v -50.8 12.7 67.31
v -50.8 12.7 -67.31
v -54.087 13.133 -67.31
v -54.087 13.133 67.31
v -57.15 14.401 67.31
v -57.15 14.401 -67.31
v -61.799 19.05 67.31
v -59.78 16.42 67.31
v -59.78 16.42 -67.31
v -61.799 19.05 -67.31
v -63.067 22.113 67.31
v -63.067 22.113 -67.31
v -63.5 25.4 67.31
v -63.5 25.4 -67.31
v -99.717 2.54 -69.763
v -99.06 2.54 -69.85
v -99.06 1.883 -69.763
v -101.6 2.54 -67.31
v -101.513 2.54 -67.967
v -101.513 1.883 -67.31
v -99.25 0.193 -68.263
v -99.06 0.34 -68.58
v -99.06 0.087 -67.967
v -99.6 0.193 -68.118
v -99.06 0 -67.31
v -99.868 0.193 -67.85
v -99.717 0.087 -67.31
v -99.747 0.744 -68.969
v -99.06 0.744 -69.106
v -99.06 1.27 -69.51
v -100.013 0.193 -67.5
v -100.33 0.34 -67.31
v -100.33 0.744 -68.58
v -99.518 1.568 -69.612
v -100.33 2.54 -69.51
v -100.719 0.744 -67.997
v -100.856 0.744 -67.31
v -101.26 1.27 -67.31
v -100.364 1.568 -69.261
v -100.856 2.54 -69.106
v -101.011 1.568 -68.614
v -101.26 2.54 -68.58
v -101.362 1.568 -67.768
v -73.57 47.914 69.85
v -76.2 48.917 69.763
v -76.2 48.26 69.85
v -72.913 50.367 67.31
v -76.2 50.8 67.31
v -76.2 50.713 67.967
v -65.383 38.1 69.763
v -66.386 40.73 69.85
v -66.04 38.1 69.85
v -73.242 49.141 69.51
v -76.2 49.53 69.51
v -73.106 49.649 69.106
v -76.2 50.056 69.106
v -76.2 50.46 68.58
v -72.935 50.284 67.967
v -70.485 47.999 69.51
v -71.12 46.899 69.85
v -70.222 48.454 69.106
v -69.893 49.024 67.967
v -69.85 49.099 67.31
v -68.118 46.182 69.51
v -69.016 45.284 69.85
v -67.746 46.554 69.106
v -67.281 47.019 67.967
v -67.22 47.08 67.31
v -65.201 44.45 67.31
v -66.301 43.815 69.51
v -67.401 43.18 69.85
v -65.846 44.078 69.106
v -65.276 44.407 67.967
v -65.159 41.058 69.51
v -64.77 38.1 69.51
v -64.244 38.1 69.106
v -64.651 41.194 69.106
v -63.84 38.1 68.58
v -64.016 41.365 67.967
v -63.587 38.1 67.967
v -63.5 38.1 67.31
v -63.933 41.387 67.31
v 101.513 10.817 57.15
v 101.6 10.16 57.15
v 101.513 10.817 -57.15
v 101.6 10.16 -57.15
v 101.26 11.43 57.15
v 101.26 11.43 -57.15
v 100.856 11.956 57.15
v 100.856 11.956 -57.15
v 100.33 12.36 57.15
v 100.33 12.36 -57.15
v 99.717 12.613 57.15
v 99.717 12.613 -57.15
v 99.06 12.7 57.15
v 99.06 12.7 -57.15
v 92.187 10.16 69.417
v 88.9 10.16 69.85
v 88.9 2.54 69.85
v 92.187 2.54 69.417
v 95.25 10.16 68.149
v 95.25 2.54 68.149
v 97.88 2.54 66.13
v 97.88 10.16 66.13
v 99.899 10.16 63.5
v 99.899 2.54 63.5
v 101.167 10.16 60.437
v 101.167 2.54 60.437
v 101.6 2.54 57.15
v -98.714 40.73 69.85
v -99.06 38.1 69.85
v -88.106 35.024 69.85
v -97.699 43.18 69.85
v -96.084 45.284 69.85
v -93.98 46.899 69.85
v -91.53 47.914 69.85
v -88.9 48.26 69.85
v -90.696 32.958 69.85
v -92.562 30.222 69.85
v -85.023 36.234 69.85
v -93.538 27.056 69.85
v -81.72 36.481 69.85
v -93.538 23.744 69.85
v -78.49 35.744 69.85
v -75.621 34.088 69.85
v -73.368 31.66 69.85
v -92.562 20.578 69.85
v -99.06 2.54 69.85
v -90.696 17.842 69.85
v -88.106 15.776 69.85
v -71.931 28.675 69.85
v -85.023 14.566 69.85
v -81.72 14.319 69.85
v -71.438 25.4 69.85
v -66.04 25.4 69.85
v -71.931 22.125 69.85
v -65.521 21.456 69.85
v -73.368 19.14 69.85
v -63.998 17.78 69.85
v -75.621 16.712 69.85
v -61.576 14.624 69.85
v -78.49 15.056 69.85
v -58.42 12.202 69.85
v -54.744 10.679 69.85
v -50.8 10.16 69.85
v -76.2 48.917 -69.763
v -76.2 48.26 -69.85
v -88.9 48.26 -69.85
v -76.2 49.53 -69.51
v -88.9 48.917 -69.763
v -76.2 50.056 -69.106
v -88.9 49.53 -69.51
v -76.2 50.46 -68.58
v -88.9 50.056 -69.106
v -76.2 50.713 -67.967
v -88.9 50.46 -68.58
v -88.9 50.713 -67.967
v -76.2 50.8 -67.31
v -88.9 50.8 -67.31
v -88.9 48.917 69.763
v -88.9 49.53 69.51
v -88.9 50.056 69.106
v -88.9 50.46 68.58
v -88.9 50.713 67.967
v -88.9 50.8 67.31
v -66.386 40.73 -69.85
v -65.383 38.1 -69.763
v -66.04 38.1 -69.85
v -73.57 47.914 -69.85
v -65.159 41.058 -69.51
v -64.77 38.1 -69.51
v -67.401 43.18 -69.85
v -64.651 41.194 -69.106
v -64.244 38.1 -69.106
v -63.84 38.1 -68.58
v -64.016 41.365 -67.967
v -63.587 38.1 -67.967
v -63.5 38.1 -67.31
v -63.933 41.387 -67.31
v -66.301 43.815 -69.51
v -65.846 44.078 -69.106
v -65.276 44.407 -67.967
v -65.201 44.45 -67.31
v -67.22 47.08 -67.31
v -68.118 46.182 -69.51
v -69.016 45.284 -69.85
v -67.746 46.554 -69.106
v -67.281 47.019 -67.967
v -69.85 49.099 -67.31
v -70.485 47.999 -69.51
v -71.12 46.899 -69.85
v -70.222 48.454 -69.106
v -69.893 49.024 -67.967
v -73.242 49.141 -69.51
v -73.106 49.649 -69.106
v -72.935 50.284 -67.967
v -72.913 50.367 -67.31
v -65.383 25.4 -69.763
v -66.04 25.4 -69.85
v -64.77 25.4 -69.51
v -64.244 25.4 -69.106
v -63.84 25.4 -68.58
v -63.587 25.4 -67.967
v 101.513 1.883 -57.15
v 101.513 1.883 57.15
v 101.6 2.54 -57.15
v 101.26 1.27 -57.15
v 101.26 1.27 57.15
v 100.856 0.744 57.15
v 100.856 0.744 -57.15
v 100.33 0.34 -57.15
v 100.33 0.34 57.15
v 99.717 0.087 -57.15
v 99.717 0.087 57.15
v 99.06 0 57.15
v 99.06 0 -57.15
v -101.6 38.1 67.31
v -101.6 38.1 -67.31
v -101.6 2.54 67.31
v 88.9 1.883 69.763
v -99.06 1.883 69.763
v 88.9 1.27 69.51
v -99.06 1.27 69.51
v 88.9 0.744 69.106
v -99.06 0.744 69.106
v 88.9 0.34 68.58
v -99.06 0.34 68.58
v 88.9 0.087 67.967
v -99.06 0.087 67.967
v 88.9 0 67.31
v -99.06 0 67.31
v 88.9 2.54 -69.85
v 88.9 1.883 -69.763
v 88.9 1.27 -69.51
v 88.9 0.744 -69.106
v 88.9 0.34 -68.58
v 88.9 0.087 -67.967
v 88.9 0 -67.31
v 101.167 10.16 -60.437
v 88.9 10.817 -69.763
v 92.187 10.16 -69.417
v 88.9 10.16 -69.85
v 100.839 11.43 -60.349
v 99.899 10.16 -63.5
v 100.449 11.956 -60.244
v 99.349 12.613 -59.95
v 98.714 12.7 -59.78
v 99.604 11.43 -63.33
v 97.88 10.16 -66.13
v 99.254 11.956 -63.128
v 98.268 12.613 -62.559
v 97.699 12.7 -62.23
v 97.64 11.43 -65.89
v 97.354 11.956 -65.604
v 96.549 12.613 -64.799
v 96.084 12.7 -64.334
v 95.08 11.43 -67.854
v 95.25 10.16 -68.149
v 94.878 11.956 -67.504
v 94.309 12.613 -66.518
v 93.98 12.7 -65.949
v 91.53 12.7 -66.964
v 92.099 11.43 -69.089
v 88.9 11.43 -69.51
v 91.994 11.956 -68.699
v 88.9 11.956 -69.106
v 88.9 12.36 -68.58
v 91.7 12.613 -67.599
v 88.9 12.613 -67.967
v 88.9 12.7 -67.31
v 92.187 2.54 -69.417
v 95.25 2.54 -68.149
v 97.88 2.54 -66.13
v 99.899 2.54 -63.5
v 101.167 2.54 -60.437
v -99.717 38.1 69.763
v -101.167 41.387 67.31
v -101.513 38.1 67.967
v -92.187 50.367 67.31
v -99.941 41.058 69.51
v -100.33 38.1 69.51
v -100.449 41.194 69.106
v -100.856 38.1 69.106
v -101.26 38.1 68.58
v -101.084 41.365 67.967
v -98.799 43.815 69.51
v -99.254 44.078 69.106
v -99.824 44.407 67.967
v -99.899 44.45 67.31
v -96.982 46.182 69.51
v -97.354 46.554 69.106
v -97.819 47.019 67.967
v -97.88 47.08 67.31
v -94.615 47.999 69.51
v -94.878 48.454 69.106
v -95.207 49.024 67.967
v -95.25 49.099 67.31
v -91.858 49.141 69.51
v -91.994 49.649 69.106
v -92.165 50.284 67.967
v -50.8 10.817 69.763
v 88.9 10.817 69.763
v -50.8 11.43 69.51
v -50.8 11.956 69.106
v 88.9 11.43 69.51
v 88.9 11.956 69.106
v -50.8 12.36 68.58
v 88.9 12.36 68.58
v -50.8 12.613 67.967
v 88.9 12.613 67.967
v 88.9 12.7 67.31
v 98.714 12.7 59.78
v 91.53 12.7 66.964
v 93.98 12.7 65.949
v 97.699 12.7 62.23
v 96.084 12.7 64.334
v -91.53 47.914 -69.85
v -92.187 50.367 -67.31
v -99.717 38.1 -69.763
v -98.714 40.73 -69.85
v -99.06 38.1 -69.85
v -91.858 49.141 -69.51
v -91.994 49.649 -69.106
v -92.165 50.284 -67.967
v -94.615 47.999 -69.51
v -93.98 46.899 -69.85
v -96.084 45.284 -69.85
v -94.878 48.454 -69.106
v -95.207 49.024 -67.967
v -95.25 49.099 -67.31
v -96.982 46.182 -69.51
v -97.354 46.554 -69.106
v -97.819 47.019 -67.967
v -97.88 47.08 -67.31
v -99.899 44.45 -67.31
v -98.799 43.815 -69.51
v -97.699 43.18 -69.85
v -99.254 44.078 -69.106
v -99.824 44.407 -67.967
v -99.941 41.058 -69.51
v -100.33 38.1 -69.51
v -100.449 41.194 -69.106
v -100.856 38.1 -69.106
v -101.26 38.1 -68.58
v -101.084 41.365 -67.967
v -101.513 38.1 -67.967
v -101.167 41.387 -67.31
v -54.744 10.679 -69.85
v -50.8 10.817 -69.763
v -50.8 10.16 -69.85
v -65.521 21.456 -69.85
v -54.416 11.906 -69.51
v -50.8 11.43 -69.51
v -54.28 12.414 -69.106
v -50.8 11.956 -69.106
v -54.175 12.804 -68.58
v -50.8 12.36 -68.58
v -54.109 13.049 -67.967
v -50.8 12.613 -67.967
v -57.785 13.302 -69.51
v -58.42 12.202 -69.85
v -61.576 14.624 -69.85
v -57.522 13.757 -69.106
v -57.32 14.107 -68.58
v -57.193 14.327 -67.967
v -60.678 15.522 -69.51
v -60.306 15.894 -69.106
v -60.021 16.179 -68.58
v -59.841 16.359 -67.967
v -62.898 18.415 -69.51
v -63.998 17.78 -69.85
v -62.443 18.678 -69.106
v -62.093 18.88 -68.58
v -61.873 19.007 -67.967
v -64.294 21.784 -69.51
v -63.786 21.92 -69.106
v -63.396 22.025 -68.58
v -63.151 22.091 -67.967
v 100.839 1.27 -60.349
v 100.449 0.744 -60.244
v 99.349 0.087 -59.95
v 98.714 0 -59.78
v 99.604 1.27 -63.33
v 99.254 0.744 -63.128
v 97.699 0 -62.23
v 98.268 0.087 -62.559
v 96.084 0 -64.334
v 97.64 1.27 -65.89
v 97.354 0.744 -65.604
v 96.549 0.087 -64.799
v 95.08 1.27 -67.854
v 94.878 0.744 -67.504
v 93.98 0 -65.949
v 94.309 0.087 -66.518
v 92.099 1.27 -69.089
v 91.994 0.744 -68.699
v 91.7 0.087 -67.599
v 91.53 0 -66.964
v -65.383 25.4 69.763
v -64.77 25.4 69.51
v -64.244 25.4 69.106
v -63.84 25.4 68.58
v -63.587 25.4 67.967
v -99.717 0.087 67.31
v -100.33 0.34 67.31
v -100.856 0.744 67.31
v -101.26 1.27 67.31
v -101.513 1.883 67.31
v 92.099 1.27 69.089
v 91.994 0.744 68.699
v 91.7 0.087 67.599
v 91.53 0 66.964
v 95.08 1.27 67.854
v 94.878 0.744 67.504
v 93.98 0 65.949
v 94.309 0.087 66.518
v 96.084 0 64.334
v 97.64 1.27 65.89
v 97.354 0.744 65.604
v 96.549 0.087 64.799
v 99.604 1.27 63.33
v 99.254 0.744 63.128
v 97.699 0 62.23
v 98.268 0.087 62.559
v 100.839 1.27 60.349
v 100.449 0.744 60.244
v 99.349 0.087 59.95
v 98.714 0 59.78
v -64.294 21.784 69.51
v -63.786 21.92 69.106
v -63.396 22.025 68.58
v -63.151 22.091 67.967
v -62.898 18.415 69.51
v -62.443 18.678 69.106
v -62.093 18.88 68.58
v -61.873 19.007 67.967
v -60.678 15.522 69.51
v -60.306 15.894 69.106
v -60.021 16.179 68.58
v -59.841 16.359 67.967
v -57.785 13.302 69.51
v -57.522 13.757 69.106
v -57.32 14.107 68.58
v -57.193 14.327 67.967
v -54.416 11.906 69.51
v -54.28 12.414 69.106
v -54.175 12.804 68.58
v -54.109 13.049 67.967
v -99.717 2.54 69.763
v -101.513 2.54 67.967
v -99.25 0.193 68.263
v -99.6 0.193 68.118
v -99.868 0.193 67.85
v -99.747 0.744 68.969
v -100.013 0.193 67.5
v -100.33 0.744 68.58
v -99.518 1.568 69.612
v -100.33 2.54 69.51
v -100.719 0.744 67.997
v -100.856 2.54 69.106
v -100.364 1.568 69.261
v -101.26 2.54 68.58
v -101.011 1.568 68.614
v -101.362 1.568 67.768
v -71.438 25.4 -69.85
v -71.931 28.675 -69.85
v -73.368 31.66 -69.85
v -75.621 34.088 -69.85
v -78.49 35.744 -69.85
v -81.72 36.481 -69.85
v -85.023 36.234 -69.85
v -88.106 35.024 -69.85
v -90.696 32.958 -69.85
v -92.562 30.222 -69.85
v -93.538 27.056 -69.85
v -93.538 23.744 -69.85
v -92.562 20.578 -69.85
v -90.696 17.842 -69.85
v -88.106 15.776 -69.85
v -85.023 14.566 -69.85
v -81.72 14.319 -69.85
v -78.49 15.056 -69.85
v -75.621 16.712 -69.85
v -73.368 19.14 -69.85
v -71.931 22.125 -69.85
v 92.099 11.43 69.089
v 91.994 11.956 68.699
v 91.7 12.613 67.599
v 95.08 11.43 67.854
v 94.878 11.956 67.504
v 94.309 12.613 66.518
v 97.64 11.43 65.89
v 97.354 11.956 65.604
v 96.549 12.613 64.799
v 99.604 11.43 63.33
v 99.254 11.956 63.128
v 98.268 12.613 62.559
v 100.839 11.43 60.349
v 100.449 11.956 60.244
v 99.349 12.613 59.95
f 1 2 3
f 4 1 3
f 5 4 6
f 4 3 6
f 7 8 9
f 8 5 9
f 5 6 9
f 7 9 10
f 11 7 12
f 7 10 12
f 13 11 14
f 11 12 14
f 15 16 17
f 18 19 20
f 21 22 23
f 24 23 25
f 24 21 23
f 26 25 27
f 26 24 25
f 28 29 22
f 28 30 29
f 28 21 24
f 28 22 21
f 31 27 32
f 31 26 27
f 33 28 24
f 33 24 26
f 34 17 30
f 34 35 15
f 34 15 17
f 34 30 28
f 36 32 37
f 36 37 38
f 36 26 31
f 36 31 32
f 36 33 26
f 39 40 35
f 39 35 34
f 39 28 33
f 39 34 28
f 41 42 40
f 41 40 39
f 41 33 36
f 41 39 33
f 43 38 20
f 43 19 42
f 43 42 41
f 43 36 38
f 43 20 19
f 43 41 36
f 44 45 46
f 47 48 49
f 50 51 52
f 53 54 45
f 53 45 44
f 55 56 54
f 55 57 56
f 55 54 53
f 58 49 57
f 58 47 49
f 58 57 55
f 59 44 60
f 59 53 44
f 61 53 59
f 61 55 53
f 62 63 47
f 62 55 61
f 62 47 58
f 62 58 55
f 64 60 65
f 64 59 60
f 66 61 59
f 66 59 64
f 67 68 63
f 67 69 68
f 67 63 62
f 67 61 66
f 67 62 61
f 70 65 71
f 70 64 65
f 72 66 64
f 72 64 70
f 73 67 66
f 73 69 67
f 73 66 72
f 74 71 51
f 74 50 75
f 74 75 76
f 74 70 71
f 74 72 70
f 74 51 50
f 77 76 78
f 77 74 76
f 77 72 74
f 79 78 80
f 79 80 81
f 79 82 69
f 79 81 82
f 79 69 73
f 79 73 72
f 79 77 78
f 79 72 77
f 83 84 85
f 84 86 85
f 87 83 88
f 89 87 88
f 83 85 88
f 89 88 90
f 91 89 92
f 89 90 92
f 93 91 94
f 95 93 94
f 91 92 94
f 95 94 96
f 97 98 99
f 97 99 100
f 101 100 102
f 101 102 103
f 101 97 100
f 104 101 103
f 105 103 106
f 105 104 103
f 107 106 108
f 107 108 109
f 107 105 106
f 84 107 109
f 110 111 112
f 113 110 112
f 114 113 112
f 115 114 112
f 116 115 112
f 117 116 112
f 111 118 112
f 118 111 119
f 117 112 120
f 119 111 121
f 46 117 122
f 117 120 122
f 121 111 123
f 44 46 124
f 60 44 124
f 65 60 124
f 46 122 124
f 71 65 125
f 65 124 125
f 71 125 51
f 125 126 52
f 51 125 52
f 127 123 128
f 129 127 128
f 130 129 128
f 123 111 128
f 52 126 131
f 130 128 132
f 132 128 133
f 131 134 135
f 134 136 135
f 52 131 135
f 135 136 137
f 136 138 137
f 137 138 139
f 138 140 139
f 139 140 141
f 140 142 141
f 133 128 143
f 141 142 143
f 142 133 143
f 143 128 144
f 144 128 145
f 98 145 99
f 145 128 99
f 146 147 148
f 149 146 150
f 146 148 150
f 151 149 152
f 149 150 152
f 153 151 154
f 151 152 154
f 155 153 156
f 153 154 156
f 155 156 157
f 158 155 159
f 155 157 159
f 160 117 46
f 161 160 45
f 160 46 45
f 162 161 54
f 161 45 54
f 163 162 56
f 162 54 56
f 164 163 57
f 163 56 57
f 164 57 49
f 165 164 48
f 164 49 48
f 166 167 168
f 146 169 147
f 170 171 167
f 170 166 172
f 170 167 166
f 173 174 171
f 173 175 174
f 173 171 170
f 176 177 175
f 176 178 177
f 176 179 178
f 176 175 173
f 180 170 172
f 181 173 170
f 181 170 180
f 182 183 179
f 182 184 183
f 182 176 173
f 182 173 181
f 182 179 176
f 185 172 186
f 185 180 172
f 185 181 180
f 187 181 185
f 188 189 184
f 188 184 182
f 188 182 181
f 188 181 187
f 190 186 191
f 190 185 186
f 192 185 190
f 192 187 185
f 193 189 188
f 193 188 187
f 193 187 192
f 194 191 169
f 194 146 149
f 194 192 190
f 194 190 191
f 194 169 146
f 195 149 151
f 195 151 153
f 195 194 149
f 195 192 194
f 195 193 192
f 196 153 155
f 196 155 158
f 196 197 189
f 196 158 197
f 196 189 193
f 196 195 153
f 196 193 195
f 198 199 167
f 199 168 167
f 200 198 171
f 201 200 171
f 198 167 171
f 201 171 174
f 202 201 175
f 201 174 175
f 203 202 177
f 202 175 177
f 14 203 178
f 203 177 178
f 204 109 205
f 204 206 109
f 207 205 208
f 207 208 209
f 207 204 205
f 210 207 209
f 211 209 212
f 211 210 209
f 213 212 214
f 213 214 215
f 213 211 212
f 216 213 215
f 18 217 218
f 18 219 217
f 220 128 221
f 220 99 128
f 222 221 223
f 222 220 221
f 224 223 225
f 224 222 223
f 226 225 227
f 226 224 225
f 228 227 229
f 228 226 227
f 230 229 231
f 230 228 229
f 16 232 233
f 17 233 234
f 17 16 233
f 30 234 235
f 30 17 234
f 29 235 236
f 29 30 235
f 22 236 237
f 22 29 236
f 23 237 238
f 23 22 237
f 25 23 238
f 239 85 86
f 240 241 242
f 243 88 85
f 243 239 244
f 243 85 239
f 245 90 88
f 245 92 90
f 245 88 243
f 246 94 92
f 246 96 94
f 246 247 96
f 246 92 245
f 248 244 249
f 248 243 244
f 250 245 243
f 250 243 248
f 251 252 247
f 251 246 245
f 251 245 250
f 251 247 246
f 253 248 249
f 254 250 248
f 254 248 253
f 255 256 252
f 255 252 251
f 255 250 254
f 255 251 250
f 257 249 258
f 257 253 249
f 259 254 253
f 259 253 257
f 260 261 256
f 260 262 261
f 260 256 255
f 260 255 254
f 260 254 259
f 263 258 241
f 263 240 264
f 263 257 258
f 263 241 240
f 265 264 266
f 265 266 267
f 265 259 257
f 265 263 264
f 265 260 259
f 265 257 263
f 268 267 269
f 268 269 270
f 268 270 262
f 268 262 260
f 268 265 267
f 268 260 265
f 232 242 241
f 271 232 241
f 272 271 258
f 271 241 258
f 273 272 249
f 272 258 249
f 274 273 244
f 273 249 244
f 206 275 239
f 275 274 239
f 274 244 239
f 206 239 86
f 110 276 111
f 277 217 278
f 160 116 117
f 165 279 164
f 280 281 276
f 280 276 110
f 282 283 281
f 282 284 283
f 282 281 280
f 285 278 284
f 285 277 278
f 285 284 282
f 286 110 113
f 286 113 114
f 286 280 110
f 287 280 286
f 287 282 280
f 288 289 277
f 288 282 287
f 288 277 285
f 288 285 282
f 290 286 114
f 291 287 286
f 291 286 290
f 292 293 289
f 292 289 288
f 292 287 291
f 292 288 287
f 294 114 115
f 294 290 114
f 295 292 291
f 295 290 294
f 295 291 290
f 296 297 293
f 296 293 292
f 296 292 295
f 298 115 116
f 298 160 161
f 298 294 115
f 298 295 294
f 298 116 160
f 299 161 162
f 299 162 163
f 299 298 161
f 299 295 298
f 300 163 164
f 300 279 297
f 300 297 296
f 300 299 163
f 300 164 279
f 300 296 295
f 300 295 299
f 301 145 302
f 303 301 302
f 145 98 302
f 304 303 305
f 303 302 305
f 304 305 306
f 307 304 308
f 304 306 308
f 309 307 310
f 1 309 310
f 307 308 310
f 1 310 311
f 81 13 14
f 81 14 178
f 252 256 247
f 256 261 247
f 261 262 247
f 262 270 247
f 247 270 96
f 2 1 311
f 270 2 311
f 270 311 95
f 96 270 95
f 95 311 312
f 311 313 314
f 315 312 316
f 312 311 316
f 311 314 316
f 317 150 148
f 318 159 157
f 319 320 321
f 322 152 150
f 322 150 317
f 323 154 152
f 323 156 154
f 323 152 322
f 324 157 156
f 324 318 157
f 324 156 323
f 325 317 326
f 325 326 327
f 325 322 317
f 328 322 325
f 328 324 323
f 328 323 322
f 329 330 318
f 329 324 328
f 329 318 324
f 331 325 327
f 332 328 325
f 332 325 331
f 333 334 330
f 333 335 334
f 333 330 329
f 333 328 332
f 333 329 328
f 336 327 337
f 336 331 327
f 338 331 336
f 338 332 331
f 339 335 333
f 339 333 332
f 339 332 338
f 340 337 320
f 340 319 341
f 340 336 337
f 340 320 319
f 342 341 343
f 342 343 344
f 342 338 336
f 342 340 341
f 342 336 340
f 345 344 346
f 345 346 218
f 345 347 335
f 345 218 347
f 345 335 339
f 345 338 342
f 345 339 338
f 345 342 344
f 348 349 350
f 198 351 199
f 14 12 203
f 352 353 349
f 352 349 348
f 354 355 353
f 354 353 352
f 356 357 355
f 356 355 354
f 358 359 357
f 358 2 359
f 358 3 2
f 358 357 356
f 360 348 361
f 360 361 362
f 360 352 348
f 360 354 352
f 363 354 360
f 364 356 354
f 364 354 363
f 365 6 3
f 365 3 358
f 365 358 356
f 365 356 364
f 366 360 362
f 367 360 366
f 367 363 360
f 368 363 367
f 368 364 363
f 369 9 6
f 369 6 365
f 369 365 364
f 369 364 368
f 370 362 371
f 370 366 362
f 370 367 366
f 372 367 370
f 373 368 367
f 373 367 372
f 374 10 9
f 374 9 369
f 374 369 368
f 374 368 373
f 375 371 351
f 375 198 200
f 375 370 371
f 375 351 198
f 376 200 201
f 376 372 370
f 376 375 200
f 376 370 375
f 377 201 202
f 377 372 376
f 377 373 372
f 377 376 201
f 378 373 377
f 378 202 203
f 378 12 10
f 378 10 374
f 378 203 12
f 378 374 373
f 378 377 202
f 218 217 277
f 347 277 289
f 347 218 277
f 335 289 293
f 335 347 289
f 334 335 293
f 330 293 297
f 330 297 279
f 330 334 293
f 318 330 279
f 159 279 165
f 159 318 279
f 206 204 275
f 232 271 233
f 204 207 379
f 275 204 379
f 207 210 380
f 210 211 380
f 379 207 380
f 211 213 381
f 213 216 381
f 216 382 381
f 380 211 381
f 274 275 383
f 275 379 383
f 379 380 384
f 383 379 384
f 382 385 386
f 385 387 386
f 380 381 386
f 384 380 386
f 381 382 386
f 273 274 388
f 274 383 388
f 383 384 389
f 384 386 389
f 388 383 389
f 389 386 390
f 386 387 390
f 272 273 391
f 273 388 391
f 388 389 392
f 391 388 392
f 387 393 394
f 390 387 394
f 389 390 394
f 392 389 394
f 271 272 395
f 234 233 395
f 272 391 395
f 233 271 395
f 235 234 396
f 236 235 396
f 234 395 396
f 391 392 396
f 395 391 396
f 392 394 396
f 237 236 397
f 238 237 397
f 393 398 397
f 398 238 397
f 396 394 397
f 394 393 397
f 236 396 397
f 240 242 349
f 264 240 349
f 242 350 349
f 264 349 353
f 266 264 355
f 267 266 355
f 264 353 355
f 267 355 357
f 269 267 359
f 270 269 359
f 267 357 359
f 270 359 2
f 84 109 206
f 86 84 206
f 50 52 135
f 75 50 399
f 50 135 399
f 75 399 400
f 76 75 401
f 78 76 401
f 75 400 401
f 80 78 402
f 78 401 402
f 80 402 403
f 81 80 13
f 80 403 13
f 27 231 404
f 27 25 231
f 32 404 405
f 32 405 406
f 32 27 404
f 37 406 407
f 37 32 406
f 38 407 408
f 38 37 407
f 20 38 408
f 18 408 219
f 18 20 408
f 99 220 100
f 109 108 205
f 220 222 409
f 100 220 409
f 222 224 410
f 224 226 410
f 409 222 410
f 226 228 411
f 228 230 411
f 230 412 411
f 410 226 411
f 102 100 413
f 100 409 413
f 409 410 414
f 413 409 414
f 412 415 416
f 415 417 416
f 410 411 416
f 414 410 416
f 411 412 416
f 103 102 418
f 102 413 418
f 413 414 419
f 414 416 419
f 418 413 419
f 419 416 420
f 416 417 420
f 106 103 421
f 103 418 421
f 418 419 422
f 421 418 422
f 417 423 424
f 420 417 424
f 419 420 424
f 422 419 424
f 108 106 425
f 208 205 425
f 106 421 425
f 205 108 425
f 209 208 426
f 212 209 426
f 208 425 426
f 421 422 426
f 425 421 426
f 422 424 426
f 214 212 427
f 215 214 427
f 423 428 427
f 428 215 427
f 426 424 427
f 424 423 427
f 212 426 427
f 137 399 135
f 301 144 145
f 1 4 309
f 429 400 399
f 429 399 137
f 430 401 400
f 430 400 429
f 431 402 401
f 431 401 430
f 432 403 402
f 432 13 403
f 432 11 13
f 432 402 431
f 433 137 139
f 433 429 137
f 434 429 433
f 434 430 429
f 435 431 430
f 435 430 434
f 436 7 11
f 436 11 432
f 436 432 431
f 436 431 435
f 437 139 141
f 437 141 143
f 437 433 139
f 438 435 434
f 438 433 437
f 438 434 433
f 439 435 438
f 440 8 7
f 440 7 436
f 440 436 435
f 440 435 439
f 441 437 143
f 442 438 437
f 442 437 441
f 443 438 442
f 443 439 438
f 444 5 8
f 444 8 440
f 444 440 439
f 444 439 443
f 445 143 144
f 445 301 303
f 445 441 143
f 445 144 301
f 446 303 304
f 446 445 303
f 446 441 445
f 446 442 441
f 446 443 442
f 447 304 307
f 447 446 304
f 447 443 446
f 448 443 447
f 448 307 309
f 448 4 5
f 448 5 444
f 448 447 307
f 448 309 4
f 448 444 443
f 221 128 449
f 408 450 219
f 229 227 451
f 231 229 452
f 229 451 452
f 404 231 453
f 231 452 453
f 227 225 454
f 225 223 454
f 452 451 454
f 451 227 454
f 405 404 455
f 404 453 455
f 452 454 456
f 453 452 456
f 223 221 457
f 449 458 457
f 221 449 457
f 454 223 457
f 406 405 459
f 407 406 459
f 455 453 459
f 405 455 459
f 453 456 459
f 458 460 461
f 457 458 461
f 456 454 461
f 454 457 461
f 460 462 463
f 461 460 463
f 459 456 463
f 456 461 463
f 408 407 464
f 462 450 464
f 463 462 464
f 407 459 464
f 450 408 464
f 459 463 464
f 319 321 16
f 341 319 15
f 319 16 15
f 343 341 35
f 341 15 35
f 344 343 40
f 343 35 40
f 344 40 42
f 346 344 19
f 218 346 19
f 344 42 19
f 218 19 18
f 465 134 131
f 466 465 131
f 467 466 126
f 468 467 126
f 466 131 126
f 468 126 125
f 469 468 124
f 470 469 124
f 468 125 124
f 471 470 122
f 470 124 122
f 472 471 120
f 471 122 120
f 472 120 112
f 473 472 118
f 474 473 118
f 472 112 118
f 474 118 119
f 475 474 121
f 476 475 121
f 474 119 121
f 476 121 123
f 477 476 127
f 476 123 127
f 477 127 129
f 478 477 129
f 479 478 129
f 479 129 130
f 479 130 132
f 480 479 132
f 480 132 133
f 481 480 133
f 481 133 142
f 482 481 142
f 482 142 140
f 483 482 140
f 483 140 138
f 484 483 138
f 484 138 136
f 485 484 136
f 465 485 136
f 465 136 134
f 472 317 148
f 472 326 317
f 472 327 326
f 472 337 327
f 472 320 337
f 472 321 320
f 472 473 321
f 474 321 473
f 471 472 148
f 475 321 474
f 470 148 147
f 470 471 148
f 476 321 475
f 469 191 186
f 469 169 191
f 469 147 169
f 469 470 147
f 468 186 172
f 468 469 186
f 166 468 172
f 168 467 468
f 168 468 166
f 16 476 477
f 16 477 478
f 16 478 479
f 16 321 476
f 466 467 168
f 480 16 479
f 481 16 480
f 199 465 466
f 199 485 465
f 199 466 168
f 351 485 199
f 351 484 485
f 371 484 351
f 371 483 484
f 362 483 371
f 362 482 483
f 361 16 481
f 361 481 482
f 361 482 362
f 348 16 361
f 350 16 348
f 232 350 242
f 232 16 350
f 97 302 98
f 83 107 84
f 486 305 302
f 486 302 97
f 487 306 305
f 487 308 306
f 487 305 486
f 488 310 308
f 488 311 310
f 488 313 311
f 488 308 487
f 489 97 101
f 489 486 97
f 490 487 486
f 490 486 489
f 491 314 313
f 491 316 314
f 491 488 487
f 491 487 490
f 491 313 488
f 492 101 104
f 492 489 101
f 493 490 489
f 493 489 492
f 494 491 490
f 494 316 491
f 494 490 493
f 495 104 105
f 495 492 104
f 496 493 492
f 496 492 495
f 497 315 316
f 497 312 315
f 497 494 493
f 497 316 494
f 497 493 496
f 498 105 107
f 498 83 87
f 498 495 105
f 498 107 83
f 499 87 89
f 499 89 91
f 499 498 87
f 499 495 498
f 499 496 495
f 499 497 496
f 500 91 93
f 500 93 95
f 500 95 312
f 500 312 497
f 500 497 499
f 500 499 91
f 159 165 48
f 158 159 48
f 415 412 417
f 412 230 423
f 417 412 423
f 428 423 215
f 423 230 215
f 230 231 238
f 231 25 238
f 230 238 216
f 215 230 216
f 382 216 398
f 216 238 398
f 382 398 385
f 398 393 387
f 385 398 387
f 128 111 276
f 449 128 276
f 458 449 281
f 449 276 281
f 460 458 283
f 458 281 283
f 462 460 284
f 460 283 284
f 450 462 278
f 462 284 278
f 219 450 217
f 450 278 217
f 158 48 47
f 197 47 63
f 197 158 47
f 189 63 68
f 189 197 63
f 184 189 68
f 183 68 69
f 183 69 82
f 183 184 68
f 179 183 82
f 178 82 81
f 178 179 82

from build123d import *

# Parameters (mm, degrees)
SKETCH1_W           = 203.2
SKETCH1_H           = 139.7
BOSS_EXTRUDE1_DEPTH = 50.8
SKETCH2_W           = 165.1
SKETCH2_H           = 38.1
CUT_EXTRUDE1_DEPTH  = 181.05357536
SKETCH3_R           = 11.1125
CUT_EXTRUDE2_DEPTH  = 181.05357536
FILLET1_R           = 12.7
FILLET3_R           = 12.7
FILLET2_R           = 2.54


with BuildPart() as part:
    # Sketch1 → Boss-Extrude1 (new body)
    with BuildSketch(Plane(origin=(0, 0, 0), x_dir=(1, 0, 0), z_dir=(0, 1, 0))):
        Rectangle(SKETCH1_W, SKETCH1_H)
    extrude(amount=BOSS_EXTRUDE1_DEPTH)

    # Sketch2 → Cut-Extrude1 (cut, through all)
    with BuildSketch(Plane.XY.offset(69.85)):
        with Locations((19.05, 31.75)):
            Rectangle(SKETCH2_W, SKETCH2_H)
    extrude(amount=-CUT_EXTRUDE1_DEPTH, mode=Mode.SUBTRACT)

    # Sketch3 → Cut-Extrude2 (cut, through all)
    with BuildSketch(Plane.XY.offset(69.85)):
        with Locations((-82.55, 25.4)):
            Circle(SKETCH3_R)
    extrude(amount=-CUT_EXTRUDE2_DEPTH, mode=Mode.SUBTRACT)

    # Fillet1
    fillet1_edges = [part.edges().sort_by_distance(p)[0] for p in [
        (-101.6, 50.8, 0),
        (-63.5, 12.7, 0),
        (-63.5, 50.8, 0),
    ]]
    fillet(fillet1_edges, radius=FILLET1_R)

    # Fillet3
    fillet3_edges = [part.edges().sort_by_distance(p)[0] for p in [
        (101.6, 6.35, 69.85),
        (101.6, 6.35, -69.85),
    ]]
    fillet(fillet3_edges, radius=FILLET3_R)

    # Fillet2
    fillet2_edges = [part.edges().sort_by_distance(p)[0] for p in [
        (19.05, 12.7, 69.85),
        (19.05, 12.7, -69.85),
        (-63.5, 31.75, 69.85),
        (-63.5, 31.75, -69.85),
        (-82.55, 50.8, -69.85),
        (-82.55, 50.8, 69.85),
        (-101.6, 19.05, 69.85),
        (-67.219743879, 47.080256121, 69.85),
        (-97.880256121, 47.080256121, 69.85),
        (-101.6, 19.05, -69.85),
        (-67.219743879, 47.080256121, -69.85),
        (-97.880256121, 47.080256121, -69.85),
        (-59.780256121, 16.419743879, 69.85),
        (-59.780256121, 16.419743879, -69.85),
        (-6.35, 0, 69.85),
        (-101.6, 0, 0),
        (-6.35, 0, -69.85),
        (101.6, 0, 0),
        (97.880256121, 0, 66.130256121),
        (97.880256121, 0, -66.130256121),
        (101.6, 12.7, 0),
        (97.880256121, 12.7, 66.130256121),
        (97.880256121, 12.7, -66.130256121),
    ]]
    fillet(fillet2_edges, radius=FILLET2_R)


solid = part.part
